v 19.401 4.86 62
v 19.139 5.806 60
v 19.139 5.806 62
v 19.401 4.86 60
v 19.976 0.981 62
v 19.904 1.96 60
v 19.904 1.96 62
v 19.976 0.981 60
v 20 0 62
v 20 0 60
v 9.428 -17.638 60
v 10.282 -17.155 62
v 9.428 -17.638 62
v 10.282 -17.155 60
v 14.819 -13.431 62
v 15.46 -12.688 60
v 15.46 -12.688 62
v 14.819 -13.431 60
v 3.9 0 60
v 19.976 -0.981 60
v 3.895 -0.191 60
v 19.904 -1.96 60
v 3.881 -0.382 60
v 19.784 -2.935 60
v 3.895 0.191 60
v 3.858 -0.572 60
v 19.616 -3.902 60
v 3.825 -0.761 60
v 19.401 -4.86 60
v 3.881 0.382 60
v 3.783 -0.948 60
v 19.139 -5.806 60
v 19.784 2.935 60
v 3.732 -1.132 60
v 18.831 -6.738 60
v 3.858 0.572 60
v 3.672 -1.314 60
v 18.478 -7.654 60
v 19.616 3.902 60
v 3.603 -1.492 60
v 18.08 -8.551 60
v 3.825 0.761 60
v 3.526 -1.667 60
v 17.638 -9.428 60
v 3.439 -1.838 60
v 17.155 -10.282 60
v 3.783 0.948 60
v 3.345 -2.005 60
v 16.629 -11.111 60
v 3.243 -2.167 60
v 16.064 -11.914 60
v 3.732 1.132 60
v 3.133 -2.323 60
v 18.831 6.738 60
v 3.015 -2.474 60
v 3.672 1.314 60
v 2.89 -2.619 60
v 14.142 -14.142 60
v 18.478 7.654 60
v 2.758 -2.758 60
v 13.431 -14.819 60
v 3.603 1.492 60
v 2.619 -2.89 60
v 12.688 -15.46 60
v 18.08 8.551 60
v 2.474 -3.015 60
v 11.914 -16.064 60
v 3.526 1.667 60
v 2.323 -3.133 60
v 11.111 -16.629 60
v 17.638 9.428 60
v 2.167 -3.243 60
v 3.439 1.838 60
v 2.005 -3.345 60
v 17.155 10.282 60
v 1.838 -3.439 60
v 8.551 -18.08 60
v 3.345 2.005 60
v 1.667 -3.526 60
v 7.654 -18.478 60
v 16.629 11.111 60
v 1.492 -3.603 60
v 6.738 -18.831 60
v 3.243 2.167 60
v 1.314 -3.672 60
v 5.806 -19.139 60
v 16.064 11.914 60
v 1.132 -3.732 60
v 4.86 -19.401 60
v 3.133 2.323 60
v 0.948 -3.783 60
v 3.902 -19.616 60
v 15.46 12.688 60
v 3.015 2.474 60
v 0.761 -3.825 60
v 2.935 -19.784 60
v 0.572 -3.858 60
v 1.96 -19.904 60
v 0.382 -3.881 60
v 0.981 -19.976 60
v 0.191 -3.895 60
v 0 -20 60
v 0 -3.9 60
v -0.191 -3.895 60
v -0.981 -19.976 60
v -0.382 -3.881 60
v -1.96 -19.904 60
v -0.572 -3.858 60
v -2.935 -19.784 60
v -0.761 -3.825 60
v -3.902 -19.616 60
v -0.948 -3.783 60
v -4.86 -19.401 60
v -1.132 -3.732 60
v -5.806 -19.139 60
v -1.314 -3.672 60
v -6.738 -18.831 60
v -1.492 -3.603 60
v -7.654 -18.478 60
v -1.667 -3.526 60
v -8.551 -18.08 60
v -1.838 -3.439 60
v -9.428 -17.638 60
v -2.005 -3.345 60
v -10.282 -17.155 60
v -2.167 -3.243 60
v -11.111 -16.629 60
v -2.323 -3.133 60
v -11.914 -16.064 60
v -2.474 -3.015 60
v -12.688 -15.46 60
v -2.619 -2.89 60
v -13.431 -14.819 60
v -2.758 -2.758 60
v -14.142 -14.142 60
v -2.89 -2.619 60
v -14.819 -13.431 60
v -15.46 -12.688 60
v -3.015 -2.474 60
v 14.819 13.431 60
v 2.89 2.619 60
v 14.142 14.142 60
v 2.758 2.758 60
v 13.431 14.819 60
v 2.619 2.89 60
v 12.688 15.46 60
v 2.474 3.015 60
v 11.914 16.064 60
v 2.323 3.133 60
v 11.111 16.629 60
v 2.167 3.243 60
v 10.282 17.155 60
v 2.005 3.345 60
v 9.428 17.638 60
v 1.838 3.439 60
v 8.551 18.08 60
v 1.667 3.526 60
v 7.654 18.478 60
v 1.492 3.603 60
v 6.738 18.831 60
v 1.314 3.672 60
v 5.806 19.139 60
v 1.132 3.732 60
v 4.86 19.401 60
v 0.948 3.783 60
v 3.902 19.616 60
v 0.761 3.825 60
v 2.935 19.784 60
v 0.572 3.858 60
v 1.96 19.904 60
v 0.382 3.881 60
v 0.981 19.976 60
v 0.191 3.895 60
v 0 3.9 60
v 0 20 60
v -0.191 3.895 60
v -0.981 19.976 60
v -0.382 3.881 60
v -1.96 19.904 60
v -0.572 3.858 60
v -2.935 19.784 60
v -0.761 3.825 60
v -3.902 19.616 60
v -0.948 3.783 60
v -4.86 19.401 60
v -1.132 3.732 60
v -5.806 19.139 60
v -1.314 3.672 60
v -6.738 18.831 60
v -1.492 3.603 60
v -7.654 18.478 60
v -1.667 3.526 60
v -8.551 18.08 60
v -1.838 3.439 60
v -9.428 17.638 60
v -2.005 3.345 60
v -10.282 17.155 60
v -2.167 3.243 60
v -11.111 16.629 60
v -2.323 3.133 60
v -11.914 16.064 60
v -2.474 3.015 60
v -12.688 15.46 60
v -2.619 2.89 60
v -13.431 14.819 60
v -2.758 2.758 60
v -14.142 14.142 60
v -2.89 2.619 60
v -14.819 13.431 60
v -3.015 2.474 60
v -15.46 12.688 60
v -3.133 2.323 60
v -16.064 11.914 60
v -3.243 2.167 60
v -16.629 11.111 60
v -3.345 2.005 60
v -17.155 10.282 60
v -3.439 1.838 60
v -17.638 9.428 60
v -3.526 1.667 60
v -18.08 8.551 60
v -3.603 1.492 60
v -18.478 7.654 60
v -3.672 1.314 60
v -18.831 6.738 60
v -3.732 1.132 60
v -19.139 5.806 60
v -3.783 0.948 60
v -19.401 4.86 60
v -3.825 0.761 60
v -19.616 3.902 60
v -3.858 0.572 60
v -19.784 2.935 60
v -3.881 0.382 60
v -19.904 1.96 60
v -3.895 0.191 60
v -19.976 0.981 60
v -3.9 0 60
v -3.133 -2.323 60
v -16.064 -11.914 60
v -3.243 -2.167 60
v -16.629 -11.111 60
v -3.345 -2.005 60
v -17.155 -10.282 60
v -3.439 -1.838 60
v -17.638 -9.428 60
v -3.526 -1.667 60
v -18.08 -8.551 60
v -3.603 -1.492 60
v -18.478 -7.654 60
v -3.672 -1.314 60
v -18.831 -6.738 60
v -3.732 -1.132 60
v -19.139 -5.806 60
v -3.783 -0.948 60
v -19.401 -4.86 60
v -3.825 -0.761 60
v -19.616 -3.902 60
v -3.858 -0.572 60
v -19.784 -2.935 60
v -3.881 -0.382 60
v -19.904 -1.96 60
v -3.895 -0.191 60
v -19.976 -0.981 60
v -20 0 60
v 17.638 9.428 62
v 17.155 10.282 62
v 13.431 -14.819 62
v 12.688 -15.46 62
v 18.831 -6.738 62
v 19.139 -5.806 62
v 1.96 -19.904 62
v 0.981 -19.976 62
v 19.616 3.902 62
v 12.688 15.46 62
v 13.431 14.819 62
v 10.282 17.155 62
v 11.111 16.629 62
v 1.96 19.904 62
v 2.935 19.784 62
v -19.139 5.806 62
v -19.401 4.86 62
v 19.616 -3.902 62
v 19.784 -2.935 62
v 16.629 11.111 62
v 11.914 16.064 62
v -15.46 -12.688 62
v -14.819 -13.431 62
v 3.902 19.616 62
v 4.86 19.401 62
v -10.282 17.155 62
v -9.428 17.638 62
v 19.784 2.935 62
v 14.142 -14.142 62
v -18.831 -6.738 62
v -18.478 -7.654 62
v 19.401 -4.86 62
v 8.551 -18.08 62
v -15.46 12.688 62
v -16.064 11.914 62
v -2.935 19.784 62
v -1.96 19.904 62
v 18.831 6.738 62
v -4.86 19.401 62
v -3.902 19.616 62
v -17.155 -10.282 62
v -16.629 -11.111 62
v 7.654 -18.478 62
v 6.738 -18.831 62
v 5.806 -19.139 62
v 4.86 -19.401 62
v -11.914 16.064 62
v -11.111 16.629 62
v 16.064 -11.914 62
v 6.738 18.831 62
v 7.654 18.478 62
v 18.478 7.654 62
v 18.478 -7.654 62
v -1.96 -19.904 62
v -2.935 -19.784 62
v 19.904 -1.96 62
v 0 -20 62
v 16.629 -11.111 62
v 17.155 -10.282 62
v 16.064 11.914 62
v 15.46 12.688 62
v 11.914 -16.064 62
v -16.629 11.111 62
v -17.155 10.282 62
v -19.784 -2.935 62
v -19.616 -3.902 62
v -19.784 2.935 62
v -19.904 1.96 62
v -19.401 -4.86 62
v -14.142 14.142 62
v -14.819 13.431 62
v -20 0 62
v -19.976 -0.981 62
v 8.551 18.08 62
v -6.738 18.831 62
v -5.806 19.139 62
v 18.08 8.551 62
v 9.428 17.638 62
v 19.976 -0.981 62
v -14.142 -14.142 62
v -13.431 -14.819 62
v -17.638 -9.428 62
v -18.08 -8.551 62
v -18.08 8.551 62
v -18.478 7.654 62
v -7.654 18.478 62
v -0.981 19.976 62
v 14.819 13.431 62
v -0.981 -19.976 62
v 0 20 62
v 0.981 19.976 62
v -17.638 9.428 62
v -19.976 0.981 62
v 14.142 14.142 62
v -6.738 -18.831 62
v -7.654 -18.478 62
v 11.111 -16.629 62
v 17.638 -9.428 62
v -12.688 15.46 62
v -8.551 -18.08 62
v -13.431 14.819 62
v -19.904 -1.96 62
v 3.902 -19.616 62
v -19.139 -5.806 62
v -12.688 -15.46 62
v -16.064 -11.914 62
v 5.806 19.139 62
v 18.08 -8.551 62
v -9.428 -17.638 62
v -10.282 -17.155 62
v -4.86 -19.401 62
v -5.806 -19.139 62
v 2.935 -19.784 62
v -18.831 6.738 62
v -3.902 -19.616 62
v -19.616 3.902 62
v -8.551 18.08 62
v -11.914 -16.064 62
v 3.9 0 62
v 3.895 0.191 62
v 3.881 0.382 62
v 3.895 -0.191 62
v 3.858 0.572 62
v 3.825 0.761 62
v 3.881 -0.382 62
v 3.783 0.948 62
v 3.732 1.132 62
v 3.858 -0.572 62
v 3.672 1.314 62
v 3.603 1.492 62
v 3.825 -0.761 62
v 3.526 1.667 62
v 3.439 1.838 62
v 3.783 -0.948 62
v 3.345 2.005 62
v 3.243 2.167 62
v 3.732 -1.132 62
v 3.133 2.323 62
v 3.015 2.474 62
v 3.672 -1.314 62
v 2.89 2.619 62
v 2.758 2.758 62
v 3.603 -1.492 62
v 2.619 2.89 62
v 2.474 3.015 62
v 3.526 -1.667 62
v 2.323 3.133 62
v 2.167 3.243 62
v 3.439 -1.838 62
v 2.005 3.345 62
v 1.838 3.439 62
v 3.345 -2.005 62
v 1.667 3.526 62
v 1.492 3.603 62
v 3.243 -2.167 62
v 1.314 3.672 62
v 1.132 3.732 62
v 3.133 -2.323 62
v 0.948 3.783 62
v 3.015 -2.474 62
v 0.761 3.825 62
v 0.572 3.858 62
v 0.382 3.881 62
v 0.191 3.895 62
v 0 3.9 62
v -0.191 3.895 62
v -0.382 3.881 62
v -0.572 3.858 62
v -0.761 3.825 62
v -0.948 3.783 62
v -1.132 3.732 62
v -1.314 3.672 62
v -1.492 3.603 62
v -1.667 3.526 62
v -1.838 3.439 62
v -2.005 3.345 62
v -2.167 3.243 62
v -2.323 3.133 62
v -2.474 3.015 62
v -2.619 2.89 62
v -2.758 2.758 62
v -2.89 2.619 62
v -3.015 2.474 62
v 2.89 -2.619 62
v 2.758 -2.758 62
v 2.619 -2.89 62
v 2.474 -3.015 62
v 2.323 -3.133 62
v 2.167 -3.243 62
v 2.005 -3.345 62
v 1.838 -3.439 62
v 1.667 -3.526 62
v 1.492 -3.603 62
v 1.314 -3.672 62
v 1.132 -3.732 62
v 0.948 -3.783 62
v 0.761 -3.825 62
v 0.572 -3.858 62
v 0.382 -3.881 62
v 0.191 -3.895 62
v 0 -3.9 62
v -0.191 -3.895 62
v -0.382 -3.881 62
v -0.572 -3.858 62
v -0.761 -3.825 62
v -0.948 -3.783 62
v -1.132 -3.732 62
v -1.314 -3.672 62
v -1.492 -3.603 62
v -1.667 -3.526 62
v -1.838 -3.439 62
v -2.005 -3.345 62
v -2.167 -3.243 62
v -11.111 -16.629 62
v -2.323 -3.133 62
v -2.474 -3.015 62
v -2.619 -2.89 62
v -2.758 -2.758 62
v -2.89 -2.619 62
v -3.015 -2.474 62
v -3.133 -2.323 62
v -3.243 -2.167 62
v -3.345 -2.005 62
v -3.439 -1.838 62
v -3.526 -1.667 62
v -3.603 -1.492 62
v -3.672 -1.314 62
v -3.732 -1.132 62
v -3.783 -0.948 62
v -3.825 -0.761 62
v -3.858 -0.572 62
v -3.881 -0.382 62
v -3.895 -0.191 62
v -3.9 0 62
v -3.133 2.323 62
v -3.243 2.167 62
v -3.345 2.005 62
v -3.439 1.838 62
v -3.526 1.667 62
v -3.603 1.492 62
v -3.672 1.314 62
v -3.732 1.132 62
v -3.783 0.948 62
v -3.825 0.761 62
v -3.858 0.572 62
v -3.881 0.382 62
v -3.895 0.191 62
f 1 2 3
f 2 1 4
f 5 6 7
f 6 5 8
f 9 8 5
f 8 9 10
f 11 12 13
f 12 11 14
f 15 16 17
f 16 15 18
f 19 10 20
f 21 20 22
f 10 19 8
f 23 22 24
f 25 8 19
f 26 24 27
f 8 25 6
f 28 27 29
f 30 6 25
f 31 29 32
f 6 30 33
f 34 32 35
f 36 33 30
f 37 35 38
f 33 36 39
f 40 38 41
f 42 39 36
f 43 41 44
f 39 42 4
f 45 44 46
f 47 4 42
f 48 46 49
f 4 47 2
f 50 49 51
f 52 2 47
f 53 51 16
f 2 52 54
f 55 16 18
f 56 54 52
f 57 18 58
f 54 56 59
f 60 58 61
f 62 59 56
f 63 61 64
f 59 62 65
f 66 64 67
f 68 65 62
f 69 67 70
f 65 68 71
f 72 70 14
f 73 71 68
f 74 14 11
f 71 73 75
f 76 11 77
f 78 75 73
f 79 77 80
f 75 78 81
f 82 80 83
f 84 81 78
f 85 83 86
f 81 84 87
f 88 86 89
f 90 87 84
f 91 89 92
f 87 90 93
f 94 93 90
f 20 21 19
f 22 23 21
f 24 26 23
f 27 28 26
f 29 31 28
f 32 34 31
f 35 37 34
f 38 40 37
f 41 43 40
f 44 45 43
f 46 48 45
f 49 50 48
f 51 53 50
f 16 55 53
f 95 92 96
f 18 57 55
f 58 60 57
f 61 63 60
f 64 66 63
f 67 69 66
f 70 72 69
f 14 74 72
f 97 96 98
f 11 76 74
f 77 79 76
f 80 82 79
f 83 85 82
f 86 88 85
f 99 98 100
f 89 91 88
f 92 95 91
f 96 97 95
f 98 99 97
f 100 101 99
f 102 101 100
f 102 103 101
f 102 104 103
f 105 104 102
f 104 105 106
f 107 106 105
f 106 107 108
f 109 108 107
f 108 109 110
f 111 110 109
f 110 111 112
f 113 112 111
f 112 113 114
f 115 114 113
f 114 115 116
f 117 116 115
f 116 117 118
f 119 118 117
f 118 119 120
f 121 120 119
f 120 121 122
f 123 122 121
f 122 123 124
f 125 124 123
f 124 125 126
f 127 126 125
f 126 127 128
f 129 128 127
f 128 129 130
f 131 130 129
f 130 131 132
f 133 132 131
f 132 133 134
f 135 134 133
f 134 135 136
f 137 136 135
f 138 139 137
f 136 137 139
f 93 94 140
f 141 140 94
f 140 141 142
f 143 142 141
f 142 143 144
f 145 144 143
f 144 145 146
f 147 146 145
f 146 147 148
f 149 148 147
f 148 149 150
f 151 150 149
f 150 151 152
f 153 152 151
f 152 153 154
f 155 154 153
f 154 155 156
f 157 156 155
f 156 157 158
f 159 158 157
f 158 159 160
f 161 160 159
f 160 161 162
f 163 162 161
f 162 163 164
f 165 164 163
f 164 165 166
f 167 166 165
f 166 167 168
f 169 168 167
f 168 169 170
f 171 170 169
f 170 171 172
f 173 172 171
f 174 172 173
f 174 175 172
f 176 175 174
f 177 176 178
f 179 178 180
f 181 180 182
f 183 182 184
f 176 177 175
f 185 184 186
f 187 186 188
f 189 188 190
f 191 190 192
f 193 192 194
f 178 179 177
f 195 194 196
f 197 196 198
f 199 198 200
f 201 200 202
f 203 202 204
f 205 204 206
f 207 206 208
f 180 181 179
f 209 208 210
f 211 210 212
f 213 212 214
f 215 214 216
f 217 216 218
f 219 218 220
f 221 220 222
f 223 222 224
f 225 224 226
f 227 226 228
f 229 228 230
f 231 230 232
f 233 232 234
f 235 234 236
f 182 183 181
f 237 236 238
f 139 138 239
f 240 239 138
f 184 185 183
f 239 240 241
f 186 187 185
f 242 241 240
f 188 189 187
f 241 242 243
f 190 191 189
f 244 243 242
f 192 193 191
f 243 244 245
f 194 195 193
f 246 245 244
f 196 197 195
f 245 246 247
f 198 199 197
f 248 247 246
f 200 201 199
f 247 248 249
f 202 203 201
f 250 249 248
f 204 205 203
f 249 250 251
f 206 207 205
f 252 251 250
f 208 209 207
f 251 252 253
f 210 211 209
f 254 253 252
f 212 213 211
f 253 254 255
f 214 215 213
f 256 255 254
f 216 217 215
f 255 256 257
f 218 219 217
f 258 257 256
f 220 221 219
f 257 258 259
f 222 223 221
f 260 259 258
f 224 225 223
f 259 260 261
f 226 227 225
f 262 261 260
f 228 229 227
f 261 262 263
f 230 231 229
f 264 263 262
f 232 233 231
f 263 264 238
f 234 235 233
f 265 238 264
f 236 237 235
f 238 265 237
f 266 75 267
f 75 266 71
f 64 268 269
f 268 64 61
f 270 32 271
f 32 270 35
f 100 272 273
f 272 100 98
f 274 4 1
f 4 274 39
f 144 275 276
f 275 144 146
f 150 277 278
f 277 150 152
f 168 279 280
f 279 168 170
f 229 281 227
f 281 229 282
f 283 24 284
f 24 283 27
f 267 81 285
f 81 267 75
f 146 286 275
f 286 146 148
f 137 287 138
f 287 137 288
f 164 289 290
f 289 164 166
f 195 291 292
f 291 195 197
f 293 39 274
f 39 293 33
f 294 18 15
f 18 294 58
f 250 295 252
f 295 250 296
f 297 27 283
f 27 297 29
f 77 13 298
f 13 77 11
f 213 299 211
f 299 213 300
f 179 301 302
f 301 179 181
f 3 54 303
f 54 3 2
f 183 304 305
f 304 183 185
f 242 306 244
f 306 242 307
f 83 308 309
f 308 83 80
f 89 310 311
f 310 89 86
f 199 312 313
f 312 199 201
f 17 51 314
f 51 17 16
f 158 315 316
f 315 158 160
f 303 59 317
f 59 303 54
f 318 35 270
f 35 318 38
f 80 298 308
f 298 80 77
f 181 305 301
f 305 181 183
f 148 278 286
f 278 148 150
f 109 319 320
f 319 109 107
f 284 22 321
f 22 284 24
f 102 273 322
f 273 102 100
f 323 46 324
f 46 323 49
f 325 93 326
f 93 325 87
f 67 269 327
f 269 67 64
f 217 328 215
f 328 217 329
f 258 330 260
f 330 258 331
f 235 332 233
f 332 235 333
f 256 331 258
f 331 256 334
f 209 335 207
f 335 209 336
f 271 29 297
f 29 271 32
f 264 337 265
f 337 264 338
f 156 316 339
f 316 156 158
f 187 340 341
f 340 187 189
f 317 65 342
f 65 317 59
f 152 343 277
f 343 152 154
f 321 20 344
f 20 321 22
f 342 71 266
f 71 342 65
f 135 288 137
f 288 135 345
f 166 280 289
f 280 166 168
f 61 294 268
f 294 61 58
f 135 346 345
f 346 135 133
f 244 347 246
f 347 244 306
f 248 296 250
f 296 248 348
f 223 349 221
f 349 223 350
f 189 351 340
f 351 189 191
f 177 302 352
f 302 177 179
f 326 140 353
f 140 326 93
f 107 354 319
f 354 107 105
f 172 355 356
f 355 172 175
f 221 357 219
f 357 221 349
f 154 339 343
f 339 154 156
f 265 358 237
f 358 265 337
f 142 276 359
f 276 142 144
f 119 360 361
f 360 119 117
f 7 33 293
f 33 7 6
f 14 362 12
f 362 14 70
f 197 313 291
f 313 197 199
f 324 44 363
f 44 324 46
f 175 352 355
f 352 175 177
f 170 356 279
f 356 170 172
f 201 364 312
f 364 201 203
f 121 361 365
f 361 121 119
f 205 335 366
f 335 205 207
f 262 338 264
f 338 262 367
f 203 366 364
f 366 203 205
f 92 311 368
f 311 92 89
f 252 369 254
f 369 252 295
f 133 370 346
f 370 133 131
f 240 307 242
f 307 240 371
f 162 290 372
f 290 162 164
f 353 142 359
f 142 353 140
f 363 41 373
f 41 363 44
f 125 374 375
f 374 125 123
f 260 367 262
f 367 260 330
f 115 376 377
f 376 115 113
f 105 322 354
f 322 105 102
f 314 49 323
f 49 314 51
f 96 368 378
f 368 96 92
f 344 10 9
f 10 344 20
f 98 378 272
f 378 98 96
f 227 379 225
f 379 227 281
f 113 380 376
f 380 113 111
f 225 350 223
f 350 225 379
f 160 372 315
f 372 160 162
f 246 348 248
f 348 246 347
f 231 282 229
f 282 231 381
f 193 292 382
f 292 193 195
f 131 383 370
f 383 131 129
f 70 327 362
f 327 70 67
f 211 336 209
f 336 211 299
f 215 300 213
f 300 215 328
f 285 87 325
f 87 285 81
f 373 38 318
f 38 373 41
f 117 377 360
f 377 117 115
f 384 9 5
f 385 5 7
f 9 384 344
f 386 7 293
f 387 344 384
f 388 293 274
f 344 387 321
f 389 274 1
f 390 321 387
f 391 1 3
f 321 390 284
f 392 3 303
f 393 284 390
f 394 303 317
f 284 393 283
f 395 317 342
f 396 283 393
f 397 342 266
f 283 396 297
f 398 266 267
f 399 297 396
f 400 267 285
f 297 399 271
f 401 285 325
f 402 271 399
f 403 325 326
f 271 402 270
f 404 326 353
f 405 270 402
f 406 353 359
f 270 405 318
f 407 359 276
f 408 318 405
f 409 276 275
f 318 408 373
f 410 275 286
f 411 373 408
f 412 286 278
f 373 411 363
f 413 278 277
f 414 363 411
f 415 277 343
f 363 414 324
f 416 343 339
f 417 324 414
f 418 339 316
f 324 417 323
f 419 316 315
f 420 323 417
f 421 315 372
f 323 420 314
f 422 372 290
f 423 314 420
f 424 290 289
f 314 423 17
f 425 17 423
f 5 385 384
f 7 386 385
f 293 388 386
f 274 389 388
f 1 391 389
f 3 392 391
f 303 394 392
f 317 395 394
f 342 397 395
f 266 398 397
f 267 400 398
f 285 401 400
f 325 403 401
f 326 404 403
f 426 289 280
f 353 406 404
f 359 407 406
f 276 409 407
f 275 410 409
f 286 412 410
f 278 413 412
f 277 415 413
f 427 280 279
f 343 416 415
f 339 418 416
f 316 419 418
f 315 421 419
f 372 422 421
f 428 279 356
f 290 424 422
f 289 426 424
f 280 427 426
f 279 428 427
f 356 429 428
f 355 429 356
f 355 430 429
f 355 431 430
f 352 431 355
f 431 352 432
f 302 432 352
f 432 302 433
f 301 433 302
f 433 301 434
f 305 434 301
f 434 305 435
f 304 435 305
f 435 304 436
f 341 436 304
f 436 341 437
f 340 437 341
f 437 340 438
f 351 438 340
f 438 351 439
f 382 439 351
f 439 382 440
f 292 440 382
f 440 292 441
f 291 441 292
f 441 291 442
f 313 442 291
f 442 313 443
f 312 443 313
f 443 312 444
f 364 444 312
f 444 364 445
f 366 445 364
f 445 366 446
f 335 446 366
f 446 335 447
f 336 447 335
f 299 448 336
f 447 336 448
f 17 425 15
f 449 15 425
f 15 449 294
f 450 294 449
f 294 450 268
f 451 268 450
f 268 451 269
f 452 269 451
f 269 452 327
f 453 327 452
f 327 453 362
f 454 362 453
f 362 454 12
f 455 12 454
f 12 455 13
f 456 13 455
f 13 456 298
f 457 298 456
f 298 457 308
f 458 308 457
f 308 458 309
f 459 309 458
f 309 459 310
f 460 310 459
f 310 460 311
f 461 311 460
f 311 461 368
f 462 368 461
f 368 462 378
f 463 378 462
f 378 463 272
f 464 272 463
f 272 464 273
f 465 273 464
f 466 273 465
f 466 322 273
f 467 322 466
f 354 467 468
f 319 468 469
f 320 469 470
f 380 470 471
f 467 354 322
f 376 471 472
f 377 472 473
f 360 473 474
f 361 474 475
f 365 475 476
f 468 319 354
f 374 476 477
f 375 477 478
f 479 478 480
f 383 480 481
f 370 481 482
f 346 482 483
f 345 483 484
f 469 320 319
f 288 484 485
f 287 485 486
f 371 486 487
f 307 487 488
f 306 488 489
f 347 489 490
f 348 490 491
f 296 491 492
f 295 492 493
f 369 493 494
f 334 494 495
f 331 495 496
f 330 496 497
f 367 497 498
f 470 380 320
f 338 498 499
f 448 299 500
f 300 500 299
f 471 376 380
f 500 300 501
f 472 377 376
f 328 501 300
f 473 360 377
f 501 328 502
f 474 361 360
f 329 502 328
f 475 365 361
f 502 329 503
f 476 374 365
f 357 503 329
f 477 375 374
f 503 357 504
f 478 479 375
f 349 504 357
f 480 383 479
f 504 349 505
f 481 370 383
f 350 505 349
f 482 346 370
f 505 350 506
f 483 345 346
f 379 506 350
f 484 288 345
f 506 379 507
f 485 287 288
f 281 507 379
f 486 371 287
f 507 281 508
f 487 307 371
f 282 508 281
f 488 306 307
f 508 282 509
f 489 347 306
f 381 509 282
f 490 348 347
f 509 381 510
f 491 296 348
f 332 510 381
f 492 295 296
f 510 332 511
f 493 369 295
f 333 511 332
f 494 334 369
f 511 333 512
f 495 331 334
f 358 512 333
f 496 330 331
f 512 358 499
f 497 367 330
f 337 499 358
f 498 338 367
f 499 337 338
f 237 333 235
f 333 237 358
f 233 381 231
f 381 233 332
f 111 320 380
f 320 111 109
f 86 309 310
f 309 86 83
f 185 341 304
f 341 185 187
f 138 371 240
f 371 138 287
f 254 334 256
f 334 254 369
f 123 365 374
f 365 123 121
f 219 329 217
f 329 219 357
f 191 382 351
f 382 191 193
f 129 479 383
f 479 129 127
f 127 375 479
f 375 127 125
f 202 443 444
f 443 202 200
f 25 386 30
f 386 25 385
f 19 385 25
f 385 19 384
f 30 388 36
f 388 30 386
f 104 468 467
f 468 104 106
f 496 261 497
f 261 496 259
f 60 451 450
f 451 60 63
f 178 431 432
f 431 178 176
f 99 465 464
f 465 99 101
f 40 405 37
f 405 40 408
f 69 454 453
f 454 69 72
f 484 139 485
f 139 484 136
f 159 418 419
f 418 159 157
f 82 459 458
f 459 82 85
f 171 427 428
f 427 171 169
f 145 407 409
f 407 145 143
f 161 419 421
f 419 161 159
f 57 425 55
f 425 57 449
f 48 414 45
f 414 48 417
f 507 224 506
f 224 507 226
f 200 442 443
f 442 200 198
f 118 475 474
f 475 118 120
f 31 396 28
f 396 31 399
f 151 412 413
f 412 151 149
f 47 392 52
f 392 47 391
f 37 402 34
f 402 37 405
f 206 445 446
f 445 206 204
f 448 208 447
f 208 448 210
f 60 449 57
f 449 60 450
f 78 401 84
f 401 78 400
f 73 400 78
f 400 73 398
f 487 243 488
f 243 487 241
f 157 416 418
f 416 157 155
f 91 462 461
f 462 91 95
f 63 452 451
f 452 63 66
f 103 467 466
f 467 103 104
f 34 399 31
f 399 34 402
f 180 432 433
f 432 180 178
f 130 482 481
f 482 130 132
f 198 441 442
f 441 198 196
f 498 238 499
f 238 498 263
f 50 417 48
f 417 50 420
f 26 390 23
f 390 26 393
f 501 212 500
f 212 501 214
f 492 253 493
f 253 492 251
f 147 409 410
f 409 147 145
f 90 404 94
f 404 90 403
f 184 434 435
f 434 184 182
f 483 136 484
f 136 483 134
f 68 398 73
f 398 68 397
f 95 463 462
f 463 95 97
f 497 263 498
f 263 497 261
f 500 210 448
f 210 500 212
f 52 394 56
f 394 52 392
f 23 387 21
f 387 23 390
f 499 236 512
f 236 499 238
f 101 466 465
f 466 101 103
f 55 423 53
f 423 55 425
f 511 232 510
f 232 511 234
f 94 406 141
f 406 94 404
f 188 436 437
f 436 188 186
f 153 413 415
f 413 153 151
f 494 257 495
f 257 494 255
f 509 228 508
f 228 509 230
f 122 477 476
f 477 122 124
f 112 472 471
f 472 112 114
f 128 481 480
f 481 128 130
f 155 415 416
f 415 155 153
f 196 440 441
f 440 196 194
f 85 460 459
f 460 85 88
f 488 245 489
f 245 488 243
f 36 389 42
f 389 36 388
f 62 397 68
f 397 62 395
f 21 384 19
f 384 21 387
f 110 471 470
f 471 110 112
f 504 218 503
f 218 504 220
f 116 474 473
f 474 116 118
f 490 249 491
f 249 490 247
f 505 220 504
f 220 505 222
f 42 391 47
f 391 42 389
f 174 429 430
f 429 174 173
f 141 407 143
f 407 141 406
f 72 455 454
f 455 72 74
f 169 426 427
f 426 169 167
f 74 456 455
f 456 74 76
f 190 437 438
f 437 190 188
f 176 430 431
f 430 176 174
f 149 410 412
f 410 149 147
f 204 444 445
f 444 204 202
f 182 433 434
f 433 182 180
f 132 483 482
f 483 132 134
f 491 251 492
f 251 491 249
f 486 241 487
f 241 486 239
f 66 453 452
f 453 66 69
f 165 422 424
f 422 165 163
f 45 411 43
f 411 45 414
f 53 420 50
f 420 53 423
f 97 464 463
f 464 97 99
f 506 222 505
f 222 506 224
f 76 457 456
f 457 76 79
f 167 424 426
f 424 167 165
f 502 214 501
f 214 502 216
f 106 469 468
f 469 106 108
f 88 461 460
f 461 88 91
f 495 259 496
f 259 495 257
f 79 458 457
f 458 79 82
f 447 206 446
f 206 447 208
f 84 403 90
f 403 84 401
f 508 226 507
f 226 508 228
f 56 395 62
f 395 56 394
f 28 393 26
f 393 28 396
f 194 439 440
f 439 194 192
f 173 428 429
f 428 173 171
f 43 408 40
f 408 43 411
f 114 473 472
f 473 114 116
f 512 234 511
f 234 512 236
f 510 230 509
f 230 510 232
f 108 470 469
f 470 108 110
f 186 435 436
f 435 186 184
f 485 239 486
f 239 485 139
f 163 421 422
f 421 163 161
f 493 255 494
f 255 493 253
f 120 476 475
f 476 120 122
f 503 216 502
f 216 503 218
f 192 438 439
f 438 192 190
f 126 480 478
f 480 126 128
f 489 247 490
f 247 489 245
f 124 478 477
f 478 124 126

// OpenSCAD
// file: common_params.scad
cylinder_radius = 20.000000;
cylinder_height = 60.000000;
wall_thickness = 2.000000;

cap_thickness = 2.000000;

rod_radius = 2.000000;
rod_height = 50.000000;

ring_outer_radius = 8.000000;
ring_inner_radius = 4.000000;
ring_thickness = 3.000000;
ring_z = 40.000000;

$fn = 128;
// main file
include <common_params.scad>;

hole_radius = 3.900000;

translate([0, 0, cylinder_height])
difference() {
    cylinder(h = cap_thickness, r = cylinder_radius);
    translate([0, 0, -0.1])
        cylinder(h = cap_thickness + 0.2, r = hole_radius);
}
